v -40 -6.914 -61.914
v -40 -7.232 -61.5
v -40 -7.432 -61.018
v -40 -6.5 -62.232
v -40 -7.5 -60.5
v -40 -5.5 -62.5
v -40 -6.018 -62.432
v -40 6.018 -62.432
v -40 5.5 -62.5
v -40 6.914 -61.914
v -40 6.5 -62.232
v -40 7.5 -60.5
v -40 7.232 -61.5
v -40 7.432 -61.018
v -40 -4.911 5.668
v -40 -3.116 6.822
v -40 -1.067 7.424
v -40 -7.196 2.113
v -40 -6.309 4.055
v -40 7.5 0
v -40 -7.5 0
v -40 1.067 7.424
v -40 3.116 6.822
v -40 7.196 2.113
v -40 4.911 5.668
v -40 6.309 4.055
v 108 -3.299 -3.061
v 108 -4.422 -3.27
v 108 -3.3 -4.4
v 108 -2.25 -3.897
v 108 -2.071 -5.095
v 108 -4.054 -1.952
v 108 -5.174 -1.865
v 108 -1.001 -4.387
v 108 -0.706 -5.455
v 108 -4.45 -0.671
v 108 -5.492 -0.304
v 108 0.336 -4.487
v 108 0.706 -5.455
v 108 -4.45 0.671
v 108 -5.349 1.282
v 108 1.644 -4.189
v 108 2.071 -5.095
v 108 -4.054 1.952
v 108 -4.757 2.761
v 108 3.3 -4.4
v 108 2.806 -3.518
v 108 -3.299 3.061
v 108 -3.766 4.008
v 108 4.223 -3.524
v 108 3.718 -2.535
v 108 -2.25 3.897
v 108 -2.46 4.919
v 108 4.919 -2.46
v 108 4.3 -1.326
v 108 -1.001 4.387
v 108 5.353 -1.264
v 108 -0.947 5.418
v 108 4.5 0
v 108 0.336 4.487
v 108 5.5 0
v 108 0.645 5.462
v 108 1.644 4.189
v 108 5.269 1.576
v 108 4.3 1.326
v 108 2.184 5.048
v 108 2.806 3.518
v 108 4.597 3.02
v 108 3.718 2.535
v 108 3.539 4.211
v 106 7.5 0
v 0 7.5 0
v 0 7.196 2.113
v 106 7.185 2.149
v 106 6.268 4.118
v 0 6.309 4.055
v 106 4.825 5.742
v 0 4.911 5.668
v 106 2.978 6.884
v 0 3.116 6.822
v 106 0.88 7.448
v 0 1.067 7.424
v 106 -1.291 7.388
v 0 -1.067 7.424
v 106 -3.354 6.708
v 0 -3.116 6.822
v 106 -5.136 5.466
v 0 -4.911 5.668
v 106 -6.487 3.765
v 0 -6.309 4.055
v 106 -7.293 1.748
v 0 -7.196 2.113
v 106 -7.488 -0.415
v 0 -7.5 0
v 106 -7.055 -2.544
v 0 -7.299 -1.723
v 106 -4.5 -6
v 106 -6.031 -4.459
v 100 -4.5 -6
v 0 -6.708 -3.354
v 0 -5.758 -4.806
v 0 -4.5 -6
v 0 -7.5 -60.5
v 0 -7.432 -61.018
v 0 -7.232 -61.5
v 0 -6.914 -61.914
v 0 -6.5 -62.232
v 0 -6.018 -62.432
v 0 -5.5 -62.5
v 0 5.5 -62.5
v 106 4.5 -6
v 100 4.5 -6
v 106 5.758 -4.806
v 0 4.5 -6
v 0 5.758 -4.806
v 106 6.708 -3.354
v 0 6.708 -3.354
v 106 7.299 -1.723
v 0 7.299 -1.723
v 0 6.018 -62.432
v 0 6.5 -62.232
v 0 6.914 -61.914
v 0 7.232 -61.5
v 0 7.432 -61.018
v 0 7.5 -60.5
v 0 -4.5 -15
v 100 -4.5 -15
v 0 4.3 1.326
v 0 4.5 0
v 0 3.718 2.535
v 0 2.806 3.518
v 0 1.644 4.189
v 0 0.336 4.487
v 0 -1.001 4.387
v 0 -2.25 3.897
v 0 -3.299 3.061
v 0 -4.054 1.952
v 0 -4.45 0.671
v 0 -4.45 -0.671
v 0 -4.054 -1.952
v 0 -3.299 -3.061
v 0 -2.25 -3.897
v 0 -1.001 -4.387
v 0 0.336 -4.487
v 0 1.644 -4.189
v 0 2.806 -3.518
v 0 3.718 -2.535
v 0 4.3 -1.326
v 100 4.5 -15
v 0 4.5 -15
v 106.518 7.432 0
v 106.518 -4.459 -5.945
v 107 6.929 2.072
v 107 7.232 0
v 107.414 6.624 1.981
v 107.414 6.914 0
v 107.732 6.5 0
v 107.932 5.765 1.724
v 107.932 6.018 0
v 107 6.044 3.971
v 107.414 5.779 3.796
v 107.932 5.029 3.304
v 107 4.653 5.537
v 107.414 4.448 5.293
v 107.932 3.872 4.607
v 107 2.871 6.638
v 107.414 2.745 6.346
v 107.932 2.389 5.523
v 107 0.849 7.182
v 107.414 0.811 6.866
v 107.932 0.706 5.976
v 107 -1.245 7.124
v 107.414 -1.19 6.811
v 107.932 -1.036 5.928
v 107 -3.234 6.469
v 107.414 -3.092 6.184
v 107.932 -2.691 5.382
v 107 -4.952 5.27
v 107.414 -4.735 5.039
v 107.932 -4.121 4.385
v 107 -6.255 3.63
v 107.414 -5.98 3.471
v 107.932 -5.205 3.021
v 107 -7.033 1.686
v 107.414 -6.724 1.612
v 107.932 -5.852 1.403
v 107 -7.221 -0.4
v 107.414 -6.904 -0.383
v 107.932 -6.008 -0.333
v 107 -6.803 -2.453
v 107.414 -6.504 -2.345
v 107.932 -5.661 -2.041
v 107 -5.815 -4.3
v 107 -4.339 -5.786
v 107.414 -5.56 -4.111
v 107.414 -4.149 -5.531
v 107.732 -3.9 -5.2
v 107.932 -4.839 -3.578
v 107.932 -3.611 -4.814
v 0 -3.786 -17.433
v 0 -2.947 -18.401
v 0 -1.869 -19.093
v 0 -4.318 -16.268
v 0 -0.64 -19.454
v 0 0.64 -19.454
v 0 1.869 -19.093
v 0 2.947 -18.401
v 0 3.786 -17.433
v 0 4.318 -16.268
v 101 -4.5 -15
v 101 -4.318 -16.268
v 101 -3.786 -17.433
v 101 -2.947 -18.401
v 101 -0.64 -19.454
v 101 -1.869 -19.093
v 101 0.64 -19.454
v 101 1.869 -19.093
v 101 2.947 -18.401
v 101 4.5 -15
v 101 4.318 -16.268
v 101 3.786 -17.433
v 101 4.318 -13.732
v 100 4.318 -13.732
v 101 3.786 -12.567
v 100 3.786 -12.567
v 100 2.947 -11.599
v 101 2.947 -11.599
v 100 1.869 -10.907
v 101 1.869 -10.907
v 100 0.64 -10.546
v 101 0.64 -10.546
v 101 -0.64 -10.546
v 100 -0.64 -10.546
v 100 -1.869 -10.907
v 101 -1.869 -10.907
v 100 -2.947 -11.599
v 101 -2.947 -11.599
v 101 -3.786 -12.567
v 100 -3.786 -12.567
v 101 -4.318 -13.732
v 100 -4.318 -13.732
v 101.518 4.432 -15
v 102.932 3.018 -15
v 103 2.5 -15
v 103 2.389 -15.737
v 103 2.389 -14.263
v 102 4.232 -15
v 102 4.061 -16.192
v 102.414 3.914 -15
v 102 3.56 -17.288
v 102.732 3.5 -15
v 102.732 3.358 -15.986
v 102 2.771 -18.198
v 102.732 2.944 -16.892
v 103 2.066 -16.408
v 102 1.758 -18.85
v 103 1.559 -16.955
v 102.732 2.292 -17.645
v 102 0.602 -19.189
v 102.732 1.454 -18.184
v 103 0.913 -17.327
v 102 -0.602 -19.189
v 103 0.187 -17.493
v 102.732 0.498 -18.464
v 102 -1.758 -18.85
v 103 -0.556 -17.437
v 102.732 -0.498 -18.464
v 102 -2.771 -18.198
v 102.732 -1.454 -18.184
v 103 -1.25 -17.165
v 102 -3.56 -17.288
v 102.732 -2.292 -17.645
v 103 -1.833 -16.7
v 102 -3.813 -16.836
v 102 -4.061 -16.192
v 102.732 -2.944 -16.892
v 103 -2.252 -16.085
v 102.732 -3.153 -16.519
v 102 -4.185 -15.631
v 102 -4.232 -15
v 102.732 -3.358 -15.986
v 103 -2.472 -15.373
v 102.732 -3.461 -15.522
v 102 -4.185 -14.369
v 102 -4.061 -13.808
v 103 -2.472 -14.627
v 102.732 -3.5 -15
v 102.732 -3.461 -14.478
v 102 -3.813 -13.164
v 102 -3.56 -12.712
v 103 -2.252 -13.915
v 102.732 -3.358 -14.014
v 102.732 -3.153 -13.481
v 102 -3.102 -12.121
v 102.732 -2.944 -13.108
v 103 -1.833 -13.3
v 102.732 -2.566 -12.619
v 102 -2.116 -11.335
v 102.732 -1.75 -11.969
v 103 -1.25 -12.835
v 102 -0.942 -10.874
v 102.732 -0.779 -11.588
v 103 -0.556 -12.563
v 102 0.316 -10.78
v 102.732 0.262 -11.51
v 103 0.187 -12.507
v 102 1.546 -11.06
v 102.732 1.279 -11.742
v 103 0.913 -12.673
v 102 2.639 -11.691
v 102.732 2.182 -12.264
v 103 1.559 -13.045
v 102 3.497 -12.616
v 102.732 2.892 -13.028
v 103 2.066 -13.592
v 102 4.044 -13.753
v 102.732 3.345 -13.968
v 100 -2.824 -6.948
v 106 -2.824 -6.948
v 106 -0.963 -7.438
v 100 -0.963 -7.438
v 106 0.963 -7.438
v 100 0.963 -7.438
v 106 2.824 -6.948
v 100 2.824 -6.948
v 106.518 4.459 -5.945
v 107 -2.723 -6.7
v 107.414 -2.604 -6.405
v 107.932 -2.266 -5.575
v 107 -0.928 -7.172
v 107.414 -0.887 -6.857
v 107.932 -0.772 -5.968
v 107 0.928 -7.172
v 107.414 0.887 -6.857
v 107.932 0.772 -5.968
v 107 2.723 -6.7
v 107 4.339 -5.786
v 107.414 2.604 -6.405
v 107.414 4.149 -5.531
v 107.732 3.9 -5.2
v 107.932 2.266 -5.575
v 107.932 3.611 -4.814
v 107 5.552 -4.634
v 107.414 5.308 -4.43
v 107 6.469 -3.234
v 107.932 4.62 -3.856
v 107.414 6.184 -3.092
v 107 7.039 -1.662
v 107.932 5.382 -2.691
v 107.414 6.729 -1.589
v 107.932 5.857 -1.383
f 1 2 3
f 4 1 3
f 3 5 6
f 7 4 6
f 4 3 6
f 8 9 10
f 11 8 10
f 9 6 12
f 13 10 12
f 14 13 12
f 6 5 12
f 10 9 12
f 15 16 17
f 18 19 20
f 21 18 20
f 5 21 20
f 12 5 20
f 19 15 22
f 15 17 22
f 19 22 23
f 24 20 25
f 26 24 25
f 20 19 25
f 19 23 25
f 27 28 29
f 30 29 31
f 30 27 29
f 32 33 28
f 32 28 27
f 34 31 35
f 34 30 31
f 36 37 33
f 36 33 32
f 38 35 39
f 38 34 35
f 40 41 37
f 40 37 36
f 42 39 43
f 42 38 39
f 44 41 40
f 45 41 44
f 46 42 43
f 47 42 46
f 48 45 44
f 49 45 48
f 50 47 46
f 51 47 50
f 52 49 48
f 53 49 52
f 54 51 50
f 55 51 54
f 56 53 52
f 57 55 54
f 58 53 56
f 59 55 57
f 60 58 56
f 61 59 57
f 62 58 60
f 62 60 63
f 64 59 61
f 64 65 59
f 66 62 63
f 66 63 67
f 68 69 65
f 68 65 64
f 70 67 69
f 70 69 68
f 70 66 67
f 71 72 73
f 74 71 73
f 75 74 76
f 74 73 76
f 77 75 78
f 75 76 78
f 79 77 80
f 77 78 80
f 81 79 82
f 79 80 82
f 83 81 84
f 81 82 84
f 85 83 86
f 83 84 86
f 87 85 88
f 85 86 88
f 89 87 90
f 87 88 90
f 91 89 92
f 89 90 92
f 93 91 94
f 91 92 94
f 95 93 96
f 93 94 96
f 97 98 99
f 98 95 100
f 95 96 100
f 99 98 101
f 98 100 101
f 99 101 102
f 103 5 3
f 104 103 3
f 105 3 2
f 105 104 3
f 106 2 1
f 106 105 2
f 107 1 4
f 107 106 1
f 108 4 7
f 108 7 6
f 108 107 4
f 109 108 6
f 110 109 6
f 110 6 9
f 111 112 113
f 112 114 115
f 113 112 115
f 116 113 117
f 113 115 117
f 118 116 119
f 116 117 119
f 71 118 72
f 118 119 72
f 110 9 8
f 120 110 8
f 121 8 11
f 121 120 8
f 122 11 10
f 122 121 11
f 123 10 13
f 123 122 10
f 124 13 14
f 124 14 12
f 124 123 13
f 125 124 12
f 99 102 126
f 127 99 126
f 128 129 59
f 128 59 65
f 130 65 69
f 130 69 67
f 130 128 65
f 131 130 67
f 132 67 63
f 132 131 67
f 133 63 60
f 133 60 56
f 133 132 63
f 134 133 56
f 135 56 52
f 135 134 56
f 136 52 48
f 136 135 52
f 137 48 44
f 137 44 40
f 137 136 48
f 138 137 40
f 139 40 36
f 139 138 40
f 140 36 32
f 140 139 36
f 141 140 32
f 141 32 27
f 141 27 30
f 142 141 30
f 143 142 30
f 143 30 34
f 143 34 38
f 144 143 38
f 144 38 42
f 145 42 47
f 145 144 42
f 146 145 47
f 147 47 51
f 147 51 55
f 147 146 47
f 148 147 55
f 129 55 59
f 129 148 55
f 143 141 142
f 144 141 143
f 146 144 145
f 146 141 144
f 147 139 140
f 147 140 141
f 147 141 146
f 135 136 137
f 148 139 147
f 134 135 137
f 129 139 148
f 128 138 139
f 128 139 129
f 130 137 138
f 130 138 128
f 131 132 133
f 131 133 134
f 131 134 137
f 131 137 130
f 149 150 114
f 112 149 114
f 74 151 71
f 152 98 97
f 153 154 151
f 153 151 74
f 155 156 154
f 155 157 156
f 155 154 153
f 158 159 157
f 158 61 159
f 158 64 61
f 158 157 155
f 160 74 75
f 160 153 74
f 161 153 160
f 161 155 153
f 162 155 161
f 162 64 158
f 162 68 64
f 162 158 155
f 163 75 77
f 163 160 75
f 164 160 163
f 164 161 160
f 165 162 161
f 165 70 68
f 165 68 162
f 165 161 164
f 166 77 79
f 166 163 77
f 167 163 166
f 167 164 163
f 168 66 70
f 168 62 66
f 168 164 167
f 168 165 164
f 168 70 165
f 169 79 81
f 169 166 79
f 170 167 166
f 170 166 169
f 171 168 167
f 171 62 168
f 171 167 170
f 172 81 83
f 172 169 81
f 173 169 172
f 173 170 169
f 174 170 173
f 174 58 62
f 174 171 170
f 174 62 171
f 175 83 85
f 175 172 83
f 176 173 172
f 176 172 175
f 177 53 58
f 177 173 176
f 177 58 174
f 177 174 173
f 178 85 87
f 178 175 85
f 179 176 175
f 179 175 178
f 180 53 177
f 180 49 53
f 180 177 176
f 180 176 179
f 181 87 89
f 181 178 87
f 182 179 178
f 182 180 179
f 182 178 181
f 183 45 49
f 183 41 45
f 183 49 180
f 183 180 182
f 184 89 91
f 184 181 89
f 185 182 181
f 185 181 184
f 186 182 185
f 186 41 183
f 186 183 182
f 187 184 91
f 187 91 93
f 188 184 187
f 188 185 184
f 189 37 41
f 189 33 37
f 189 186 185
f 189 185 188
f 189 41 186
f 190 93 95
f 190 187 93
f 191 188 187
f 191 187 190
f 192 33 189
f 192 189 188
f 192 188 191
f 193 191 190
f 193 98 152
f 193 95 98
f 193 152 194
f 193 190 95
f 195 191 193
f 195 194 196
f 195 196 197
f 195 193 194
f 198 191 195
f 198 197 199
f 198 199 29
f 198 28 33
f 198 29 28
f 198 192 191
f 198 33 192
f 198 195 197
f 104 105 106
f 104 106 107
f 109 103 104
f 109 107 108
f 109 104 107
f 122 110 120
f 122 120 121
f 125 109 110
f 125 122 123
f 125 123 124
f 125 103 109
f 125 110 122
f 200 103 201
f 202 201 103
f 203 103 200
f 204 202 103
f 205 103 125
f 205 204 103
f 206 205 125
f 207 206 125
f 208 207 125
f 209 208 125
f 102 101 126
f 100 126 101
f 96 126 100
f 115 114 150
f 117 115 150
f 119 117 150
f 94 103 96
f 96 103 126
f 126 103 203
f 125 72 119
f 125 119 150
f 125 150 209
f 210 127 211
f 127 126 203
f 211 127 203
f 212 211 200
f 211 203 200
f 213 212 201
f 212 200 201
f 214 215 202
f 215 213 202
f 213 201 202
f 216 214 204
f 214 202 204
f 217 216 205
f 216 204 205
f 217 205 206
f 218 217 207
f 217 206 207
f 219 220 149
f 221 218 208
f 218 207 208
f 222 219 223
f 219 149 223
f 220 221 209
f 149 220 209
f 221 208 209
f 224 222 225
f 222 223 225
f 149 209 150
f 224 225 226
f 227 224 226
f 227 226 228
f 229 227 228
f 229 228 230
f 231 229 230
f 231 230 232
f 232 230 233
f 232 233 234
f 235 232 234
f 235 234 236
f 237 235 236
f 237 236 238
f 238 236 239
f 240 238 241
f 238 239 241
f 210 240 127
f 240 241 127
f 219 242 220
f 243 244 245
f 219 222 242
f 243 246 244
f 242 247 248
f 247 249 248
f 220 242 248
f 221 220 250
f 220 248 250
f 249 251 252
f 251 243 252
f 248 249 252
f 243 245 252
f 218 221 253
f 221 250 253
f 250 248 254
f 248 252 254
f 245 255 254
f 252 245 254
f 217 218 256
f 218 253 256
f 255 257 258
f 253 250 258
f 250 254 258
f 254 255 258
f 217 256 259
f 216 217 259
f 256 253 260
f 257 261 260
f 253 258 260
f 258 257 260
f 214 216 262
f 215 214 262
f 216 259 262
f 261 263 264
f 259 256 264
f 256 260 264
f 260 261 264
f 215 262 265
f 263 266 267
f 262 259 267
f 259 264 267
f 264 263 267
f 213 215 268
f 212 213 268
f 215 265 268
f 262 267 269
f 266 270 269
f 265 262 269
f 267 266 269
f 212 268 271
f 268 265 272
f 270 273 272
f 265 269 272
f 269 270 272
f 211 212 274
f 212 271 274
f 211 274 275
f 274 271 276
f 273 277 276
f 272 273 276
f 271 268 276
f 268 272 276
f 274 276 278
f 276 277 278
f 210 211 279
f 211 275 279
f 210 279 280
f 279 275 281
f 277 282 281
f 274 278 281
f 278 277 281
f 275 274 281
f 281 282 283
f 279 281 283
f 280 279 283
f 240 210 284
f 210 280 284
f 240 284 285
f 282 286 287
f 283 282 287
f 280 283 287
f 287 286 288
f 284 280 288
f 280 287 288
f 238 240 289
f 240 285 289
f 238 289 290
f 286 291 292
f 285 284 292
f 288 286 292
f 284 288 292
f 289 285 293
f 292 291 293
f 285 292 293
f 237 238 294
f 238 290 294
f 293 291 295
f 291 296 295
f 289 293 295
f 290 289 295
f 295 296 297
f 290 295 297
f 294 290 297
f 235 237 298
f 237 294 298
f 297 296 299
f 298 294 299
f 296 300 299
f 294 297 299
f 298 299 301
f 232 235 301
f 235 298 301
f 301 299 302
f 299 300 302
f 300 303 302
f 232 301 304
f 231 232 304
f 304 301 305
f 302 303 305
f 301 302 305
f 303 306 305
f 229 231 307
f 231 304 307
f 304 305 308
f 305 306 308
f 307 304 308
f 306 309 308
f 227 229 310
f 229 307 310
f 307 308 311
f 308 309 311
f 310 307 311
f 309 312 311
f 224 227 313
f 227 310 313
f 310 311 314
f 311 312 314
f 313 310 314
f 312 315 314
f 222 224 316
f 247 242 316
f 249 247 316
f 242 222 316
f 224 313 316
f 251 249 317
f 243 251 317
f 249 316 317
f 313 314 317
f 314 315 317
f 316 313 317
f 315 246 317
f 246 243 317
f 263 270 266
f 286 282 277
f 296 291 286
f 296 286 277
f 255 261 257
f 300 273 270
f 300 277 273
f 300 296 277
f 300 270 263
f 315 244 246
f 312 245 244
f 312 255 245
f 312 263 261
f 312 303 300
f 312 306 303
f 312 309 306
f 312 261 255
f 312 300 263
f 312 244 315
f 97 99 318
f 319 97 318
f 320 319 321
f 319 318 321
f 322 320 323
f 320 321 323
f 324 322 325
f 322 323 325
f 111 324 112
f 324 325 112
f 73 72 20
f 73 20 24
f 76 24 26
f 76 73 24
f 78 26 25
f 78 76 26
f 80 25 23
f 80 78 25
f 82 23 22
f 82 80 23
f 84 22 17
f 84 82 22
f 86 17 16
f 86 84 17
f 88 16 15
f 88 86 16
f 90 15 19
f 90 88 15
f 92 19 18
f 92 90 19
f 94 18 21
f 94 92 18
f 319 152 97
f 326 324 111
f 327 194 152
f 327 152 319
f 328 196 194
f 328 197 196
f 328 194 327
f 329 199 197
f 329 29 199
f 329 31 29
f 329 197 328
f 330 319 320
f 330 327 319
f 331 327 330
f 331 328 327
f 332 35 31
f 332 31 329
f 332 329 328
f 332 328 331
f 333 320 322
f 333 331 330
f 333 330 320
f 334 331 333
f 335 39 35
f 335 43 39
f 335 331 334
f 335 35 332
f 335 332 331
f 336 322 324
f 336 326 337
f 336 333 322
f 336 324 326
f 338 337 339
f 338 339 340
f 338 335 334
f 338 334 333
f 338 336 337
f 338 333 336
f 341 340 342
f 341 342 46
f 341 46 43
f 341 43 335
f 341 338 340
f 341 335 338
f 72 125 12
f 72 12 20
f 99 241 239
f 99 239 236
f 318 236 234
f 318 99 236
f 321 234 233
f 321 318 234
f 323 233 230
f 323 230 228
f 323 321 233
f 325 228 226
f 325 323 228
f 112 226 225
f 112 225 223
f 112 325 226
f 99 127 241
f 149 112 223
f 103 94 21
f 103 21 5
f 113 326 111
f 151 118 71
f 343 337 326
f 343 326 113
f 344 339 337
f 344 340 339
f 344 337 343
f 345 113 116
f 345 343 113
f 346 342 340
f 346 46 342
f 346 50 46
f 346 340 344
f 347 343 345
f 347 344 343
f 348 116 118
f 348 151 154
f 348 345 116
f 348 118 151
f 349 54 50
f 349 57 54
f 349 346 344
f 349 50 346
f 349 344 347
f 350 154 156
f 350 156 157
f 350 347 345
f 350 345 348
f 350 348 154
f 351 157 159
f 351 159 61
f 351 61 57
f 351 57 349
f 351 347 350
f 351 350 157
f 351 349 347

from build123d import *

# Parameters (mm, degrees)
F1_DEPTH = 103
F2_DEPTH = 100
F0_R     = 4.5
F3_DEPTH = 108
F4_R     = 2
F7_DEPTH = 40


# Not quite as in the source:
# - a fillet or chamfer that OpenCascade refuses, or shapes differently, is made with other operations: its cross-section is extruded or revolved along the edge and cut away or added
# - after a boolean that leaves OpenCascade's solid faulty, fix() repairs it


with BuildPart() as f1:
    # F0 (on Right) → F1 (new body)
    with BuildSketch(Plane.YZ):
        with BuildLine():
            ThreePointArc((4.5, -15), (0, -10.5), (-4.5, -15))
            ThreePointArc((-4.5, -15), (0, -19.5), (4.5, -15))
        make_face()
    extrude(amount=F1_DEPTH)

    # F0 (on Right) → F2 (join)
    with BuildSketch(Plane.YZ):
        with BuildLine():
            ThreePointArc((4.5, -6), (0, -7.5), (-4.5, -6))
            Line((-4.5, -6), (-4.5, -15))
            ThreePointArc((-4.5, -15), (0, -10.5), (4.5, -15))
            Line((4.5, -15), (4.5, -6))
        make_face()
    extrude(amount=F2_DEPTH)

    # F0 (on Right) → F3 (join)
    with BuildSketch(Plane.YZ):
        with BuildLine():
            ThreePointArc((4.5, -6), (6.7082039325, -3.3541019662), (7.5, 0))
            ThreePointArc((7.5, 0), (-3.3541019662, 6.7082039325), (-4.5, -6))
            ThreePointArc((-4.5, -6), (0, -7.5), (4.5, -6))
        make_face()
        Circle(F0_R, mode=Mode.SUBTRACT)
    extrude(amount=F3_DEPTH)

    # F4
    f4_edges = [f1.edges().sort_by_distance(p)[0] for p in [
        (108, 4.5, 6),
    ]]
    fillet(f4_edges, radius=F4_R)

    # F5: fillet of radius 2 on 1 edges, made by hand

    # F5_s1 → F5_t2 (revolve, cut)
    with BuildSketch(Plane.XY.offset(-15)):
        with BuildLine():
            ThreePointArc((101, 4.5), (102.4142135624, 3.9142135624), (103, 2.5))
            Line((103, 2.5), (103, 4.5))
            Line((103, 4.5), (101, 4.5))
        make_face()
    revolve(axis=Axis((103, 0, -15), (-1, 0, 0)), mode=Mode.SUBTRACT)

    # F6 (on Right) → F7 (join)
    with BuildSketch(Plane.YZ):
        with BuildLine():
            ThreePointArc((-7.5, -60.5), (-6.9142135624, -61.9142135624), (-5.5, -62.5))
            Line((-5.5, -62.5), (5.5, -62.5))
            ThreePointArc((5.5, -62.5), (6.9142135624, -61.9142135624), (7.5, -60.5))
            Line((7.5, -60.5), (7.5, 0))
            ThreePointArc((7.5, 0), (5.3033008589, 5.3033008589), (0, 7.5))
            ThreePointArc((0, 7.5), (-5.3033008589, 5.3033008589), (-7.5, 0))
            Line((-7.5, 0), (-7.5, -60.5))
        make_face()
    extrude(amount=-F7_DEPTH)

    add(f1.part.fix(), mode=Mode.REPLACE)


solid = f1.part
